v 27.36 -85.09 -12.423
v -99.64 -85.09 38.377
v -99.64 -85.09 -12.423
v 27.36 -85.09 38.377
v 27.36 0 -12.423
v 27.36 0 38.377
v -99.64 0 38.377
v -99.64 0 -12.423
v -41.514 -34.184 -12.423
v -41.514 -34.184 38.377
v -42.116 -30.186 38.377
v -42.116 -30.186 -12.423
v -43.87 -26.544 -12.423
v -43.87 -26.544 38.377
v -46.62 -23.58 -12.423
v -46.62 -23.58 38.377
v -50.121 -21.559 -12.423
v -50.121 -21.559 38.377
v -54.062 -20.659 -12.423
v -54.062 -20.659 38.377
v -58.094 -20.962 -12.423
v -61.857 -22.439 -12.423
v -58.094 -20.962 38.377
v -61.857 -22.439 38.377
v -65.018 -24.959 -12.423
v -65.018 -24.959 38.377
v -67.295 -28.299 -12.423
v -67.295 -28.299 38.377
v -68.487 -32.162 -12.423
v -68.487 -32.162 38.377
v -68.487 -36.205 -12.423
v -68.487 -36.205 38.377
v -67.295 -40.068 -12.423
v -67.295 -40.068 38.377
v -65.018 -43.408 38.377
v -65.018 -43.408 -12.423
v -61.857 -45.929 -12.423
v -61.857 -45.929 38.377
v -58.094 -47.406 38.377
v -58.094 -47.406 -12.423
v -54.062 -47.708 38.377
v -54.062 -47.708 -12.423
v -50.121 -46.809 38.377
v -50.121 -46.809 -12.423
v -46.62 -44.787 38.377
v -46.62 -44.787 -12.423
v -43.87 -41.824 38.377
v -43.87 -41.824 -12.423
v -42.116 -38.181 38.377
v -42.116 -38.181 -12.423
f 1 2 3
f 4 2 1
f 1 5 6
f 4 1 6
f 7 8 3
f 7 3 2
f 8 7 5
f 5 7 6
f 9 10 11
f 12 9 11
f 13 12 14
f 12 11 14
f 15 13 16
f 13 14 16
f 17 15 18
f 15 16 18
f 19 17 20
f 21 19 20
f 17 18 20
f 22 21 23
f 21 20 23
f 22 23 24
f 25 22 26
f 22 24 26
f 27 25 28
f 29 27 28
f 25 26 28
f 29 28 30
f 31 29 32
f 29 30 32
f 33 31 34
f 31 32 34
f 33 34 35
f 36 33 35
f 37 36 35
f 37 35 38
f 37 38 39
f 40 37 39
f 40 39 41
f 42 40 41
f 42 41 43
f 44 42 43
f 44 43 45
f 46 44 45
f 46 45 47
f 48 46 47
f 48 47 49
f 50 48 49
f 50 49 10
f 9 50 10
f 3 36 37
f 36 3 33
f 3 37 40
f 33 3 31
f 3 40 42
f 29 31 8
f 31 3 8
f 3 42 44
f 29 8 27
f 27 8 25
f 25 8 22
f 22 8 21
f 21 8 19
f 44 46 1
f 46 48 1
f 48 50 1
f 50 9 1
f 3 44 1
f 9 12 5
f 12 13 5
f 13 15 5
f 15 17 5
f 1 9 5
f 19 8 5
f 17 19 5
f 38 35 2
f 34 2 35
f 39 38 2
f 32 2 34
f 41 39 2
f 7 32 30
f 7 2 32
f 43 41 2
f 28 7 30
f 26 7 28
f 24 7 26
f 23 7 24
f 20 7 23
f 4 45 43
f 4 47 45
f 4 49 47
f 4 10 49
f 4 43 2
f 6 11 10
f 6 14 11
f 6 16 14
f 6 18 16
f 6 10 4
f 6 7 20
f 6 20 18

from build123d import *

# Parameters (mm, degrees)
F0_W     = 127
F0_H     = 50.8
F1_DEPTH = 85.09
F3_R     = 13.5622431152
F4_DEPTH = 73.914


with BuildPart() as f1:
    # F0 (on Front) → F1 (new body)
    with BuildSketch(Plane.XZ):
        with Locations((-36.1398326457, 12.9770052895)):
            Rectangle(F0_W, F0_H)
    extrude(amount=F1_DEPTH)

    # F3 (on face) → F4 (cut)
    with BuildSketch(Plane.XY.offset(38.3770052895)):
        with Locations((-55.075917393, -34.1837741435)):
            Circle(F3_R)
    extrude(amount=-F4_DEPTH, mode=Mode.SUBTRACT)


solid = f1.part
